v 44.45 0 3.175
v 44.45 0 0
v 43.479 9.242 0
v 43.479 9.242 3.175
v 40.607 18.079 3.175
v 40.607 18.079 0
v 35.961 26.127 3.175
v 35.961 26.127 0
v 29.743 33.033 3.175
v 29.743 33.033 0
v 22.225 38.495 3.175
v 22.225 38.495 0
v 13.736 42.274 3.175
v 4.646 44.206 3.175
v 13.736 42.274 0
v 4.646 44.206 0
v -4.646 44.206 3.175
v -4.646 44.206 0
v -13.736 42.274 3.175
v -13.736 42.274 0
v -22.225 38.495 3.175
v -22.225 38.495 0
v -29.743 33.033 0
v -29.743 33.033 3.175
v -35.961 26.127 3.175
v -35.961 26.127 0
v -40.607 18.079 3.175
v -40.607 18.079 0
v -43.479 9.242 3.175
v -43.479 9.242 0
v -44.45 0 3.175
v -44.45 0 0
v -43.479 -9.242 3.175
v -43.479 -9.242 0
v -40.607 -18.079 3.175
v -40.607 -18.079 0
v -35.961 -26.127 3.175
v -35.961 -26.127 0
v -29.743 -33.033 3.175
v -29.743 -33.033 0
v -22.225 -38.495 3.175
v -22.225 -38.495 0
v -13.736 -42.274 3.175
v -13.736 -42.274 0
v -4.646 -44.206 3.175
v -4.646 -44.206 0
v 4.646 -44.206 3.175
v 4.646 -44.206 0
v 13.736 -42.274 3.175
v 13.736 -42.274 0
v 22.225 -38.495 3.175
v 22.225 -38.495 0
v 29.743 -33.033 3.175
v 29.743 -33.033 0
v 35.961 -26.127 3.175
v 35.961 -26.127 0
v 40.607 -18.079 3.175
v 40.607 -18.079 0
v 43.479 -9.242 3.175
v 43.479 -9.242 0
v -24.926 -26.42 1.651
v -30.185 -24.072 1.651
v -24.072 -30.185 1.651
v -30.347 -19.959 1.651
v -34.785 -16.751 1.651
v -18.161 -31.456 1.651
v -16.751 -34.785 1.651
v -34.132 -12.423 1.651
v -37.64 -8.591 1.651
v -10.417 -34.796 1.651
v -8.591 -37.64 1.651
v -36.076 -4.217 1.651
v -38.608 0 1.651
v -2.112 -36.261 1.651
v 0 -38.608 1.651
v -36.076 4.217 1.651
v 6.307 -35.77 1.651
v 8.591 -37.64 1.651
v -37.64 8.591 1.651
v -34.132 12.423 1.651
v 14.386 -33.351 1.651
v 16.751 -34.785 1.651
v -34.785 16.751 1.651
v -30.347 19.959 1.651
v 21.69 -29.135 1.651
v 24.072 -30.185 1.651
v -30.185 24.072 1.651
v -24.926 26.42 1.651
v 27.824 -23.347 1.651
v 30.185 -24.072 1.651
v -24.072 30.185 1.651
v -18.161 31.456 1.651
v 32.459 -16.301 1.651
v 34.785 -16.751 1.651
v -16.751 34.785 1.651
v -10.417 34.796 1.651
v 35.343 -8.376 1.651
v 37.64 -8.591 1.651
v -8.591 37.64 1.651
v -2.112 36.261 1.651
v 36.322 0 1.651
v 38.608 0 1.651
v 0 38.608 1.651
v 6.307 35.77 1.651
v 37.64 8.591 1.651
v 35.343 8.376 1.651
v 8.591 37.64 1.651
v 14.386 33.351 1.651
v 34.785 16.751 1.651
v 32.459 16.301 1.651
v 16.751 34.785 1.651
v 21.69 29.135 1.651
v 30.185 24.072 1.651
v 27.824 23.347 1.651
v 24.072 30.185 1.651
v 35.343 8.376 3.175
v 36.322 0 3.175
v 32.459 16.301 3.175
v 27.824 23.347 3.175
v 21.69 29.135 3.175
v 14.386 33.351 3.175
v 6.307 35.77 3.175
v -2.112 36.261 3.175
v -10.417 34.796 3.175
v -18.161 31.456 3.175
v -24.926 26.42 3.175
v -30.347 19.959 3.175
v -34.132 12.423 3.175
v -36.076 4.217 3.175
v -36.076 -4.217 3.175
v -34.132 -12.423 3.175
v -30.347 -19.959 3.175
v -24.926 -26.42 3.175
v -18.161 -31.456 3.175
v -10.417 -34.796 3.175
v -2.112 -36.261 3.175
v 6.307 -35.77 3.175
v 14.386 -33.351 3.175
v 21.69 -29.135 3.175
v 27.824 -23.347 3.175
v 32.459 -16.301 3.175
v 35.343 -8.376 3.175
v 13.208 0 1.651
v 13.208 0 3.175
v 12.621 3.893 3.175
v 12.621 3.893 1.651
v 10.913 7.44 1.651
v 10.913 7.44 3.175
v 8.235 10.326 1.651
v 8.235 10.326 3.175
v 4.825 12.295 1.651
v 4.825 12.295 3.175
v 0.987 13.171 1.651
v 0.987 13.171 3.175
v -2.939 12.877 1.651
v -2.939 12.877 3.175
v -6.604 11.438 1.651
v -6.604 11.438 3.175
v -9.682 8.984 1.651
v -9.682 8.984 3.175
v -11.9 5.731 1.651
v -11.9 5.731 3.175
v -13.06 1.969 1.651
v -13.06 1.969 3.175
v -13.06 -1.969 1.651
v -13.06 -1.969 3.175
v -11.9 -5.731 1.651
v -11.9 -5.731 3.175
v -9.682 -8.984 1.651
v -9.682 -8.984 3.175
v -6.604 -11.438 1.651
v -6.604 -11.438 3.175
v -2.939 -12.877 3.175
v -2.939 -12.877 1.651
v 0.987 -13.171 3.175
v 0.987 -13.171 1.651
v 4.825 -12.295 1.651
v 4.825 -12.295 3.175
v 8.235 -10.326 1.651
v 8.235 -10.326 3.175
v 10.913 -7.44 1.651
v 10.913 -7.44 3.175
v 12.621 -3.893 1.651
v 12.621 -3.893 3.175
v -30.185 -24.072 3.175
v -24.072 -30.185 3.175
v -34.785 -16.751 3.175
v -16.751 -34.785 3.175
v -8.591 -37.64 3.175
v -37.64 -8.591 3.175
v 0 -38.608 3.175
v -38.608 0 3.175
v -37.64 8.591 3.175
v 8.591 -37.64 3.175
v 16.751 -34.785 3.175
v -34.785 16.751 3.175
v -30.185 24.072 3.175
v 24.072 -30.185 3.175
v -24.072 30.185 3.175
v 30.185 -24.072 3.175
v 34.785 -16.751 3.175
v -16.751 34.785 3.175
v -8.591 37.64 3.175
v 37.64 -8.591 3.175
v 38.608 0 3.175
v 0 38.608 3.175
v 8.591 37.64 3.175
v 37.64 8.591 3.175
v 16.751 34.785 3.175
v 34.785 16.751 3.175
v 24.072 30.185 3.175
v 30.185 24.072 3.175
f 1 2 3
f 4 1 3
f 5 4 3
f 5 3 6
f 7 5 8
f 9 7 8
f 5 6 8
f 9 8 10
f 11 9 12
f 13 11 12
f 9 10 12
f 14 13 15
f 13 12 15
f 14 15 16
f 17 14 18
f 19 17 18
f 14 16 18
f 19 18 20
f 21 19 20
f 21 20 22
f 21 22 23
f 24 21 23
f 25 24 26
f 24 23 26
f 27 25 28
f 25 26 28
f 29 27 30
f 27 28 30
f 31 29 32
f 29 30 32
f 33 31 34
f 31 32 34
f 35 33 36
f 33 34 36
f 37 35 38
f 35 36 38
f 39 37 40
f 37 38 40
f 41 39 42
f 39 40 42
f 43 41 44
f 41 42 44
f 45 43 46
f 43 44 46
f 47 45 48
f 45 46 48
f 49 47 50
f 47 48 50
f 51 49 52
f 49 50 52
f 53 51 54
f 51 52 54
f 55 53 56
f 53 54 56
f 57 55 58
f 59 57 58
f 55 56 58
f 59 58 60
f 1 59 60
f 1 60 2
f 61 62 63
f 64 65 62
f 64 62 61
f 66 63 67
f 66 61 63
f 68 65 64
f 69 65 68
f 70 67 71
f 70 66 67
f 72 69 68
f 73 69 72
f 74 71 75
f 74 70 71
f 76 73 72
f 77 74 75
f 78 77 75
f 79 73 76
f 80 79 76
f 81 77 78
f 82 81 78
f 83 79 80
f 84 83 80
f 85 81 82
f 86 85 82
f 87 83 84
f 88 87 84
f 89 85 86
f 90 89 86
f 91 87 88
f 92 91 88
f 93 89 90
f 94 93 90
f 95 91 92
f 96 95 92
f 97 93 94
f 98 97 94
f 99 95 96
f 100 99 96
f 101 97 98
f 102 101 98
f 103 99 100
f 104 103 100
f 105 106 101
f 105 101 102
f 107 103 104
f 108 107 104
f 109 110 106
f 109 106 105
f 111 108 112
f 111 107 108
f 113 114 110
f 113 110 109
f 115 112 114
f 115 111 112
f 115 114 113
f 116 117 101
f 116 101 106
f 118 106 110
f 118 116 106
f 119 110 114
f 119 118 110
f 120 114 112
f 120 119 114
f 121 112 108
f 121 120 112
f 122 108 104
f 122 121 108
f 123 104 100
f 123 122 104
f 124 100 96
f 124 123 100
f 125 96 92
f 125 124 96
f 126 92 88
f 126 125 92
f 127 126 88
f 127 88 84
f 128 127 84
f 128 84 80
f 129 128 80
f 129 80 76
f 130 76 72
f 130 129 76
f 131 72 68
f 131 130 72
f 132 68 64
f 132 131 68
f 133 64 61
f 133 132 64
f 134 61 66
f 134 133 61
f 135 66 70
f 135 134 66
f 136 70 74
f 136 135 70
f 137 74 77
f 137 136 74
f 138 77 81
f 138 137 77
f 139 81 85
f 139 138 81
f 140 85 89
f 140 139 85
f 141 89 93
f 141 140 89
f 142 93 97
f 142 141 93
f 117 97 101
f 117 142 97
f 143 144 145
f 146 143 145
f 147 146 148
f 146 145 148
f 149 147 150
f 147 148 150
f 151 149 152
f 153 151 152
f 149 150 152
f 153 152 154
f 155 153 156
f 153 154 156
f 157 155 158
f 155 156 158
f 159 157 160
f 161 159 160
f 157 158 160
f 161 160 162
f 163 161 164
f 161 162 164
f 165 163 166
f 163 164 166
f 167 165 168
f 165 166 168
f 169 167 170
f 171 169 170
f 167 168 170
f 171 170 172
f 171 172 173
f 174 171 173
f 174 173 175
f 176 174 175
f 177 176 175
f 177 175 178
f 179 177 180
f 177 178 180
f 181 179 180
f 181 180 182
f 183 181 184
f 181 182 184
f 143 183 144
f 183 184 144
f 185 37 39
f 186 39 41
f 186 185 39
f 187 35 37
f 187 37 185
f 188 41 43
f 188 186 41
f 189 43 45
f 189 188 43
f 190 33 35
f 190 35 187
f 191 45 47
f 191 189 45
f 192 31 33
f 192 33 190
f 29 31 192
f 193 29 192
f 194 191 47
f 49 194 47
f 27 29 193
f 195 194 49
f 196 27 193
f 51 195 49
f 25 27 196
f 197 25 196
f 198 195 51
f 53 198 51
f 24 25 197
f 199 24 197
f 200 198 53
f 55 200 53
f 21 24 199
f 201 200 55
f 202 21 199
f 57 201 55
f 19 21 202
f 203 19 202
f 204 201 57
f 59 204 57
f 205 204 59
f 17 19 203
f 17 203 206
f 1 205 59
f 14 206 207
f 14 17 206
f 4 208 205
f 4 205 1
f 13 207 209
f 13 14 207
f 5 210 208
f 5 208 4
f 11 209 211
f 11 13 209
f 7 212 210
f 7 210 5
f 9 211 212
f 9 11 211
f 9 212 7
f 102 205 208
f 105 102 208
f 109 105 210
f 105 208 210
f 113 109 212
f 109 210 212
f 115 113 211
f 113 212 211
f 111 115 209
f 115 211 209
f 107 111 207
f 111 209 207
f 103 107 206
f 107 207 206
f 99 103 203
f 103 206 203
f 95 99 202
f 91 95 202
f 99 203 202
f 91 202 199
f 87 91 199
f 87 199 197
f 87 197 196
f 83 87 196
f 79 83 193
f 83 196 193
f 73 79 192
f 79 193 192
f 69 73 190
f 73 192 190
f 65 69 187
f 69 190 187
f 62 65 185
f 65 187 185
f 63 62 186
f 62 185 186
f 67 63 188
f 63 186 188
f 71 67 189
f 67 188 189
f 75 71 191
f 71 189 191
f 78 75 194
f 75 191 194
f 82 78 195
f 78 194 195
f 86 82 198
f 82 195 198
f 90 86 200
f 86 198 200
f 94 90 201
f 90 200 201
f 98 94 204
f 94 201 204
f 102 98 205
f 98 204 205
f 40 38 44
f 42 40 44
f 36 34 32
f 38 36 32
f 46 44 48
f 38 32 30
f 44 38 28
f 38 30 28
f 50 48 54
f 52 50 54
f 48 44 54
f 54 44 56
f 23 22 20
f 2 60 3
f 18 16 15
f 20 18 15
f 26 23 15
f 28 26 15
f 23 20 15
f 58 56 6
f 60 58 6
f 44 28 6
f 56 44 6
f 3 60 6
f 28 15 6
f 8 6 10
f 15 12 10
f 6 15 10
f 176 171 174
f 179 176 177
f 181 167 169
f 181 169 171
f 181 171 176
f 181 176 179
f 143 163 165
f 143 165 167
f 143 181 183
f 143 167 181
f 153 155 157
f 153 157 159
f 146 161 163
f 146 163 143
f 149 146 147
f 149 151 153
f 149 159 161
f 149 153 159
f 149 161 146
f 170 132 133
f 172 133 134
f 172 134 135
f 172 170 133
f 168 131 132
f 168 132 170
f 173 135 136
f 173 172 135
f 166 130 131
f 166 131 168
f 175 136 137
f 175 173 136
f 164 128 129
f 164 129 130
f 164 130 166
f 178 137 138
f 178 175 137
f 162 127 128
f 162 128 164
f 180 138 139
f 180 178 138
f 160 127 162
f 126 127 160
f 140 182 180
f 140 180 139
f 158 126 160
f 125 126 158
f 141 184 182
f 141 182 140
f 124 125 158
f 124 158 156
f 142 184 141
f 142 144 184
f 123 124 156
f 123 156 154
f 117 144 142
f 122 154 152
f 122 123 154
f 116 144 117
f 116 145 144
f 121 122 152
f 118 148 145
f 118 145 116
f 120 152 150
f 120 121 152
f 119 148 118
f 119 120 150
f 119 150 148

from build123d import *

# Parameters (mm, degrees)
F0_R     = 44.45
F1_DEPTH = 3.175
F2_R     = 38.608
F2_R_2   = 36.322
F2_R_3   = 13.208
F3_DEPTH = 1.524


with BuildPart() as f1:
    # F0 (on Top) → F1 (new body)
    with BuildSketch(Plane.XY):
        Circle(F0_R)
    extrude(amount=F1_DEPTH)

    # F2 (on face) → F3 (cut)
    with BuildSketch(Plane.XY.offset(3.175)):
        Circle(F2_R)
        Circle(F2_R_2, mode=Mode.SUBTRACT)
        Circle(F2_R_3)
    extrude(amount=-F3_DEPTH, mode=Mode.SUBTRACT)


solid = f1.part
